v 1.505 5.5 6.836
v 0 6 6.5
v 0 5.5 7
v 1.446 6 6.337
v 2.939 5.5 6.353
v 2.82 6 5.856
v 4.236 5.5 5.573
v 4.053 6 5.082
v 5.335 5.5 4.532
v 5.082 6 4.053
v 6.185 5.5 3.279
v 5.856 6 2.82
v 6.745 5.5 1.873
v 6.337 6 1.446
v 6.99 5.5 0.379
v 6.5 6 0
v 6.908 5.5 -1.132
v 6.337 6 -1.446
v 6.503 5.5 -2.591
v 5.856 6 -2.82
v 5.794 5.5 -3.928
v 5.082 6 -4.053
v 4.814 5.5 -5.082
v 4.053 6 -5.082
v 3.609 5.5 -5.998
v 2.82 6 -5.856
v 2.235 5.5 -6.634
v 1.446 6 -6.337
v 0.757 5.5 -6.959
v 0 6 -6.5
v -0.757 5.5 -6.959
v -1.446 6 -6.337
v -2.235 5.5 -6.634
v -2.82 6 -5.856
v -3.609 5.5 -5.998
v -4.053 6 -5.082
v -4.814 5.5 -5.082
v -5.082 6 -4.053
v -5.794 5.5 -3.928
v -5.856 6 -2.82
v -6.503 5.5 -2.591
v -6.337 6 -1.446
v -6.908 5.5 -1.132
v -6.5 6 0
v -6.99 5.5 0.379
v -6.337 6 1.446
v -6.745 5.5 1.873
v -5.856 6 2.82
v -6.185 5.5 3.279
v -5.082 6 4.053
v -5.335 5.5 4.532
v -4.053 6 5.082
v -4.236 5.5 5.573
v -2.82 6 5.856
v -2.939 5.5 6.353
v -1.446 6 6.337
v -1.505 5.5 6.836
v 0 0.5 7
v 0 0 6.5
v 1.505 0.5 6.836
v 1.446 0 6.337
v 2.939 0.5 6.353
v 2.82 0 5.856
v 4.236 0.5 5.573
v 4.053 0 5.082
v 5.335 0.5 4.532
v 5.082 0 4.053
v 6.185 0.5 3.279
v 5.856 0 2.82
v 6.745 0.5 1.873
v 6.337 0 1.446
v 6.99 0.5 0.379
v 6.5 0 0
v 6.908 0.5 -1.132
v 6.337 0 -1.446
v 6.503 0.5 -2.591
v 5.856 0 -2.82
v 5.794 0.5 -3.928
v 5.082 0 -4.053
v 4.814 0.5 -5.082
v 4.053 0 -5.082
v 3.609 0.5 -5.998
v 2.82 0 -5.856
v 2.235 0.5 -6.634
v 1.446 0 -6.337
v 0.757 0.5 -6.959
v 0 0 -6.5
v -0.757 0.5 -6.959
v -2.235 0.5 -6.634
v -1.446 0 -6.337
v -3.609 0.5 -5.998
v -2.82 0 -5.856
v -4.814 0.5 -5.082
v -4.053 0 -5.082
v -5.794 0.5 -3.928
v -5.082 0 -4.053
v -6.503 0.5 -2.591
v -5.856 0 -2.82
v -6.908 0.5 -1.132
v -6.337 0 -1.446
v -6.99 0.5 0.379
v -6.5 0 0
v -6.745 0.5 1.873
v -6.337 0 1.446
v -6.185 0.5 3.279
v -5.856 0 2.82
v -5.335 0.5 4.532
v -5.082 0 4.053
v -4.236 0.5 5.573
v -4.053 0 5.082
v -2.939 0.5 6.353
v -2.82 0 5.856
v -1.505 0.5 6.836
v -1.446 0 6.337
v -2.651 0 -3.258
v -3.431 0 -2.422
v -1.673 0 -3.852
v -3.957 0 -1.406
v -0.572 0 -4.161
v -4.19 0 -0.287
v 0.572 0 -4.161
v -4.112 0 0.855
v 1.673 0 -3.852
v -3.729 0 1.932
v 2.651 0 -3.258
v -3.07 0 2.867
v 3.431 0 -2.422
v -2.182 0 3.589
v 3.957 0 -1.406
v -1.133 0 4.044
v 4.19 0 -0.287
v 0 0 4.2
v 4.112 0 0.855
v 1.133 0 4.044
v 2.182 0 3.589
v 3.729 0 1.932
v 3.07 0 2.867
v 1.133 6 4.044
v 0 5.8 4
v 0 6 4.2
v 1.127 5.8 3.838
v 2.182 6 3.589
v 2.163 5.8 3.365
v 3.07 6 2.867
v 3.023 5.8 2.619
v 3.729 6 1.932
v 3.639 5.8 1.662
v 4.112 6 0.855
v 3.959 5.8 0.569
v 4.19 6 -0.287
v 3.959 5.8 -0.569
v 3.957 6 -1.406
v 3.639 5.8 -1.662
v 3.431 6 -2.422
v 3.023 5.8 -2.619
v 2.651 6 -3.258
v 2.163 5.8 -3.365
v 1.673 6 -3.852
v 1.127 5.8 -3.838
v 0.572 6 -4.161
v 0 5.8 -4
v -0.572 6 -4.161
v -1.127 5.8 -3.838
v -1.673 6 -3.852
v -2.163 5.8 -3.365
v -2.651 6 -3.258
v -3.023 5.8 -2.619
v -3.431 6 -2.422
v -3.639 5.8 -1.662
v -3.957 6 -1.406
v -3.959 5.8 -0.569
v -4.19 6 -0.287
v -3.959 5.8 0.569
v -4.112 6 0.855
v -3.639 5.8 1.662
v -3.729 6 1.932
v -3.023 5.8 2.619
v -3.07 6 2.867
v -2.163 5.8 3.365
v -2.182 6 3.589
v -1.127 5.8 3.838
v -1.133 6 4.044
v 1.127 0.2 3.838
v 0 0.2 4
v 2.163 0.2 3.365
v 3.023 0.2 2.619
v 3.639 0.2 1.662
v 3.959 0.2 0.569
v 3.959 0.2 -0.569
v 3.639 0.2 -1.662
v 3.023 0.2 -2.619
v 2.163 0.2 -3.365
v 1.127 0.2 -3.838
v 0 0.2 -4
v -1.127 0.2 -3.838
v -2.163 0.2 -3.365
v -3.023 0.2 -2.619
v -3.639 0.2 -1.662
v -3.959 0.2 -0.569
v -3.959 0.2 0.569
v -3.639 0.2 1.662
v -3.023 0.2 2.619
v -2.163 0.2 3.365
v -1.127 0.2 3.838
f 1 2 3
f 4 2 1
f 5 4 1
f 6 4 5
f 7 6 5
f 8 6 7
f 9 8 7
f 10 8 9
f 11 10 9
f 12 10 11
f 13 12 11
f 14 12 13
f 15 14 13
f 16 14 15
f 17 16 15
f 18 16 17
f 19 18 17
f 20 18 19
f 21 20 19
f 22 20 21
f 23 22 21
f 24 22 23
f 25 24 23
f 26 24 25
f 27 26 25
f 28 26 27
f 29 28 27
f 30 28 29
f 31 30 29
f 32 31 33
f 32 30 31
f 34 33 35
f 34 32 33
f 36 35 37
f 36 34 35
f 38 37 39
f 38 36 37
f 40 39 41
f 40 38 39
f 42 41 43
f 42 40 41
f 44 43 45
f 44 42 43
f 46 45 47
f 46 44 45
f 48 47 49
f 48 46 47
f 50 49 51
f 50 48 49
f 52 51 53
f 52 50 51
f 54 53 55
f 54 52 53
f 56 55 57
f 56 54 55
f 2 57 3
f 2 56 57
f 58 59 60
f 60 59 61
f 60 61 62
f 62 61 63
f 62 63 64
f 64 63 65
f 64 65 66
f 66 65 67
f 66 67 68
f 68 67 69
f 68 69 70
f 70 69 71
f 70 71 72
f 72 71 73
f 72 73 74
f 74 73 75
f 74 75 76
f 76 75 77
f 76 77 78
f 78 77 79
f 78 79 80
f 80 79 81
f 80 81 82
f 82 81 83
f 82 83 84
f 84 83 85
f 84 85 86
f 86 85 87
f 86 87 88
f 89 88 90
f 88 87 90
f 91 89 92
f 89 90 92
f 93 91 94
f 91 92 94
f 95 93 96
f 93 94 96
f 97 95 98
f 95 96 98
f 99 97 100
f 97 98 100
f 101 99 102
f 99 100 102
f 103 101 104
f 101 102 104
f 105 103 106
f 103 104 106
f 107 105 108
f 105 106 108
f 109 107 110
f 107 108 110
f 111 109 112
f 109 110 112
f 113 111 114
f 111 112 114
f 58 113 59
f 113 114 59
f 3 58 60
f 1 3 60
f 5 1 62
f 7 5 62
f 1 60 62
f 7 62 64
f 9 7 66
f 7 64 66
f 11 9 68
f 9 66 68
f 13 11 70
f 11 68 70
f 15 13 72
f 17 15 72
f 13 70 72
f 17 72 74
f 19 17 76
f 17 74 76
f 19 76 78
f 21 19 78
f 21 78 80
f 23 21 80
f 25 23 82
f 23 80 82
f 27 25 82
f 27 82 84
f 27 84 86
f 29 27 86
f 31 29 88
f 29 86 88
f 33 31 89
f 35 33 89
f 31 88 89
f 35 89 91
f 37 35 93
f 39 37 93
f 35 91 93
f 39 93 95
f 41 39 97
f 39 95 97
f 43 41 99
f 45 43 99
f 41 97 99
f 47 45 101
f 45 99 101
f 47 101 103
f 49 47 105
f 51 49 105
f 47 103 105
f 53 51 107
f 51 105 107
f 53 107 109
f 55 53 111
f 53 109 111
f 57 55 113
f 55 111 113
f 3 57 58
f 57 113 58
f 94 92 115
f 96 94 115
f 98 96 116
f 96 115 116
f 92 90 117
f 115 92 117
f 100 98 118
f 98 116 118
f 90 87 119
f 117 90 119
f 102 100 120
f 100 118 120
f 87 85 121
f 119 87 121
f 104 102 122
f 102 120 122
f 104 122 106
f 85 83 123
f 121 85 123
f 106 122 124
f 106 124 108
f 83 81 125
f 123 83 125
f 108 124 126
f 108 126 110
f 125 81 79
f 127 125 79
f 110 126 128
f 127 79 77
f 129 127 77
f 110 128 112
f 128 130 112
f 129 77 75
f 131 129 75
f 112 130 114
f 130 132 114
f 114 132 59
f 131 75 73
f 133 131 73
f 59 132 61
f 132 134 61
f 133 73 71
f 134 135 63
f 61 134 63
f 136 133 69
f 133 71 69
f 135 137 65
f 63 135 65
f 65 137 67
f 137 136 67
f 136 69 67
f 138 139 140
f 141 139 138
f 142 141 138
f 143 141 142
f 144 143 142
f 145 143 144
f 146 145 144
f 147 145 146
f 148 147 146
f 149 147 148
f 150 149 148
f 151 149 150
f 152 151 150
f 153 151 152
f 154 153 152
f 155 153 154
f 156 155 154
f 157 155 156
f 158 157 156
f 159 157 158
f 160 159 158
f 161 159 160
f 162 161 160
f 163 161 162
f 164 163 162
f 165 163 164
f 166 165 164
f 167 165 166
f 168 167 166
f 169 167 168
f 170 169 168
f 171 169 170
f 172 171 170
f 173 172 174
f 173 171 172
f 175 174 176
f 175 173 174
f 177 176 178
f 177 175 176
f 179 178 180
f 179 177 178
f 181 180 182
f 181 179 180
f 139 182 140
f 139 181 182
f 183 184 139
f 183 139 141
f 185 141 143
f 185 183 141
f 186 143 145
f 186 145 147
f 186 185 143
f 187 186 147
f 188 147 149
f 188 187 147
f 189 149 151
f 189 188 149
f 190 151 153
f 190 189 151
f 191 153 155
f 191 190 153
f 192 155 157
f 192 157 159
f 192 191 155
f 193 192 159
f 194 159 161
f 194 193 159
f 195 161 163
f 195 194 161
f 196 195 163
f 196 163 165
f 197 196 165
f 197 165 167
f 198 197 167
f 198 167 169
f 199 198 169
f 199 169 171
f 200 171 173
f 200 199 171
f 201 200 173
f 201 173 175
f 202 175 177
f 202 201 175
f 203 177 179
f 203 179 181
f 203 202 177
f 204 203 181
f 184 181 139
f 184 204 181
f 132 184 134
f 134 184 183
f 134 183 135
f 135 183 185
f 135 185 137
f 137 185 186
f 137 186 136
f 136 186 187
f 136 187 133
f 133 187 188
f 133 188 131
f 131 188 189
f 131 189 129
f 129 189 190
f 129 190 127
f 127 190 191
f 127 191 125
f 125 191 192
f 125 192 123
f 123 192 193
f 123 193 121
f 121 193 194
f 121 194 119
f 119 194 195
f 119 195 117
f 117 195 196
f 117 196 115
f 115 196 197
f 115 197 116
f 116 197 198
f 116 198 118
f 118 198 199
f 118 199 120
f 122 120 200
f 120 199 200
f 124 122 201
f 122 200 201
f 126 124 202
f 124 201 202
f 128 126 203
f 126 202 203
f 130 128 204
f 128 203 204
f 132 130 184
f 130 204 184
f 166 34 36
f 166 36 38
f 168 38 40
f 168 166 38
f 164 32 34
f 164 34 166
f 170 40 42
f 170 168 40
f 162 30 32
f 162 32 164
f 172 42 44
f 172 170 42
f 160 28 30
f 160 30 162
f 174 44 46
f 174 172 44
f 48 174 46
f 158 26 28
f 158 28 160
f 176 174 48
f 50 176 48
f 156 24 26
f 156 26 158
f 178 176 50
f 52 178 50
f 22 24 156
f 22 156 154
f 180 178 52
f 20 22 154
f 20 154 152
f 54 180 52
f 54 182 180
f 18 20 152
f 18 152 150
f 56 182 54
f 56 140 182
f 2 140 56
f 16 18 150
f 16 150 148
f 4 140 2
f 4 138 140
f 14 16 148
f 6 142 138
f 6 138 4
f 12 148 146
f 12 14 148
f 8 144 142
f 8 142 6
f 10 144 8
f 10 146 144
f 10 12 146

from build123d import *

# Parameters (mm, degrees)
SKETCH1_R           = 7
SKETCH1_R_2         = 4
BOSS_EXTRUDE1_DEPTH = 6
CHAMFER1_SIZE       = 0.5
CHAMFER2_SIZE       = 0.2


with BuildPart() as part:
    # Sketch1 → Boss-Extrude1 (new body)
    with BuildSketch(Plane(origin=(0, 0, 0), x_dir=(1, 0, 0), z_dir=(0, 1, 0))):
        with Locations(Location((0, 0, 0), (0, 0, 270))):
            Circle(SKETCH1_R)
        with Locations(Location((0, 0, 0), (0, 0, 270))):
            Circle(SKETCH1_R_2, mode=Mode.SUBTRACT)
    extrude(amount=BOSS_EXTRUDE1_DEPTH)

    # Chamfer1
    chamfer1_edges = [part.edges().sort_by_distance(p)[0] for p in [
        (0, 0, -7),
        (0, 6, -7),
    ]]
    chamfer(chamfer1_edges, length=CHAMFER1_SIZE)

    # Chamfer2
    chamfer2_edges = [part.edges().sort_by_distance(p)[0] for p in [
        (0, 0, -4),
        (0, 6, -4),
    ]]
    chamfer(chamfer2_edges, length=CHAMFER2_SIZE)


solid = part.part
